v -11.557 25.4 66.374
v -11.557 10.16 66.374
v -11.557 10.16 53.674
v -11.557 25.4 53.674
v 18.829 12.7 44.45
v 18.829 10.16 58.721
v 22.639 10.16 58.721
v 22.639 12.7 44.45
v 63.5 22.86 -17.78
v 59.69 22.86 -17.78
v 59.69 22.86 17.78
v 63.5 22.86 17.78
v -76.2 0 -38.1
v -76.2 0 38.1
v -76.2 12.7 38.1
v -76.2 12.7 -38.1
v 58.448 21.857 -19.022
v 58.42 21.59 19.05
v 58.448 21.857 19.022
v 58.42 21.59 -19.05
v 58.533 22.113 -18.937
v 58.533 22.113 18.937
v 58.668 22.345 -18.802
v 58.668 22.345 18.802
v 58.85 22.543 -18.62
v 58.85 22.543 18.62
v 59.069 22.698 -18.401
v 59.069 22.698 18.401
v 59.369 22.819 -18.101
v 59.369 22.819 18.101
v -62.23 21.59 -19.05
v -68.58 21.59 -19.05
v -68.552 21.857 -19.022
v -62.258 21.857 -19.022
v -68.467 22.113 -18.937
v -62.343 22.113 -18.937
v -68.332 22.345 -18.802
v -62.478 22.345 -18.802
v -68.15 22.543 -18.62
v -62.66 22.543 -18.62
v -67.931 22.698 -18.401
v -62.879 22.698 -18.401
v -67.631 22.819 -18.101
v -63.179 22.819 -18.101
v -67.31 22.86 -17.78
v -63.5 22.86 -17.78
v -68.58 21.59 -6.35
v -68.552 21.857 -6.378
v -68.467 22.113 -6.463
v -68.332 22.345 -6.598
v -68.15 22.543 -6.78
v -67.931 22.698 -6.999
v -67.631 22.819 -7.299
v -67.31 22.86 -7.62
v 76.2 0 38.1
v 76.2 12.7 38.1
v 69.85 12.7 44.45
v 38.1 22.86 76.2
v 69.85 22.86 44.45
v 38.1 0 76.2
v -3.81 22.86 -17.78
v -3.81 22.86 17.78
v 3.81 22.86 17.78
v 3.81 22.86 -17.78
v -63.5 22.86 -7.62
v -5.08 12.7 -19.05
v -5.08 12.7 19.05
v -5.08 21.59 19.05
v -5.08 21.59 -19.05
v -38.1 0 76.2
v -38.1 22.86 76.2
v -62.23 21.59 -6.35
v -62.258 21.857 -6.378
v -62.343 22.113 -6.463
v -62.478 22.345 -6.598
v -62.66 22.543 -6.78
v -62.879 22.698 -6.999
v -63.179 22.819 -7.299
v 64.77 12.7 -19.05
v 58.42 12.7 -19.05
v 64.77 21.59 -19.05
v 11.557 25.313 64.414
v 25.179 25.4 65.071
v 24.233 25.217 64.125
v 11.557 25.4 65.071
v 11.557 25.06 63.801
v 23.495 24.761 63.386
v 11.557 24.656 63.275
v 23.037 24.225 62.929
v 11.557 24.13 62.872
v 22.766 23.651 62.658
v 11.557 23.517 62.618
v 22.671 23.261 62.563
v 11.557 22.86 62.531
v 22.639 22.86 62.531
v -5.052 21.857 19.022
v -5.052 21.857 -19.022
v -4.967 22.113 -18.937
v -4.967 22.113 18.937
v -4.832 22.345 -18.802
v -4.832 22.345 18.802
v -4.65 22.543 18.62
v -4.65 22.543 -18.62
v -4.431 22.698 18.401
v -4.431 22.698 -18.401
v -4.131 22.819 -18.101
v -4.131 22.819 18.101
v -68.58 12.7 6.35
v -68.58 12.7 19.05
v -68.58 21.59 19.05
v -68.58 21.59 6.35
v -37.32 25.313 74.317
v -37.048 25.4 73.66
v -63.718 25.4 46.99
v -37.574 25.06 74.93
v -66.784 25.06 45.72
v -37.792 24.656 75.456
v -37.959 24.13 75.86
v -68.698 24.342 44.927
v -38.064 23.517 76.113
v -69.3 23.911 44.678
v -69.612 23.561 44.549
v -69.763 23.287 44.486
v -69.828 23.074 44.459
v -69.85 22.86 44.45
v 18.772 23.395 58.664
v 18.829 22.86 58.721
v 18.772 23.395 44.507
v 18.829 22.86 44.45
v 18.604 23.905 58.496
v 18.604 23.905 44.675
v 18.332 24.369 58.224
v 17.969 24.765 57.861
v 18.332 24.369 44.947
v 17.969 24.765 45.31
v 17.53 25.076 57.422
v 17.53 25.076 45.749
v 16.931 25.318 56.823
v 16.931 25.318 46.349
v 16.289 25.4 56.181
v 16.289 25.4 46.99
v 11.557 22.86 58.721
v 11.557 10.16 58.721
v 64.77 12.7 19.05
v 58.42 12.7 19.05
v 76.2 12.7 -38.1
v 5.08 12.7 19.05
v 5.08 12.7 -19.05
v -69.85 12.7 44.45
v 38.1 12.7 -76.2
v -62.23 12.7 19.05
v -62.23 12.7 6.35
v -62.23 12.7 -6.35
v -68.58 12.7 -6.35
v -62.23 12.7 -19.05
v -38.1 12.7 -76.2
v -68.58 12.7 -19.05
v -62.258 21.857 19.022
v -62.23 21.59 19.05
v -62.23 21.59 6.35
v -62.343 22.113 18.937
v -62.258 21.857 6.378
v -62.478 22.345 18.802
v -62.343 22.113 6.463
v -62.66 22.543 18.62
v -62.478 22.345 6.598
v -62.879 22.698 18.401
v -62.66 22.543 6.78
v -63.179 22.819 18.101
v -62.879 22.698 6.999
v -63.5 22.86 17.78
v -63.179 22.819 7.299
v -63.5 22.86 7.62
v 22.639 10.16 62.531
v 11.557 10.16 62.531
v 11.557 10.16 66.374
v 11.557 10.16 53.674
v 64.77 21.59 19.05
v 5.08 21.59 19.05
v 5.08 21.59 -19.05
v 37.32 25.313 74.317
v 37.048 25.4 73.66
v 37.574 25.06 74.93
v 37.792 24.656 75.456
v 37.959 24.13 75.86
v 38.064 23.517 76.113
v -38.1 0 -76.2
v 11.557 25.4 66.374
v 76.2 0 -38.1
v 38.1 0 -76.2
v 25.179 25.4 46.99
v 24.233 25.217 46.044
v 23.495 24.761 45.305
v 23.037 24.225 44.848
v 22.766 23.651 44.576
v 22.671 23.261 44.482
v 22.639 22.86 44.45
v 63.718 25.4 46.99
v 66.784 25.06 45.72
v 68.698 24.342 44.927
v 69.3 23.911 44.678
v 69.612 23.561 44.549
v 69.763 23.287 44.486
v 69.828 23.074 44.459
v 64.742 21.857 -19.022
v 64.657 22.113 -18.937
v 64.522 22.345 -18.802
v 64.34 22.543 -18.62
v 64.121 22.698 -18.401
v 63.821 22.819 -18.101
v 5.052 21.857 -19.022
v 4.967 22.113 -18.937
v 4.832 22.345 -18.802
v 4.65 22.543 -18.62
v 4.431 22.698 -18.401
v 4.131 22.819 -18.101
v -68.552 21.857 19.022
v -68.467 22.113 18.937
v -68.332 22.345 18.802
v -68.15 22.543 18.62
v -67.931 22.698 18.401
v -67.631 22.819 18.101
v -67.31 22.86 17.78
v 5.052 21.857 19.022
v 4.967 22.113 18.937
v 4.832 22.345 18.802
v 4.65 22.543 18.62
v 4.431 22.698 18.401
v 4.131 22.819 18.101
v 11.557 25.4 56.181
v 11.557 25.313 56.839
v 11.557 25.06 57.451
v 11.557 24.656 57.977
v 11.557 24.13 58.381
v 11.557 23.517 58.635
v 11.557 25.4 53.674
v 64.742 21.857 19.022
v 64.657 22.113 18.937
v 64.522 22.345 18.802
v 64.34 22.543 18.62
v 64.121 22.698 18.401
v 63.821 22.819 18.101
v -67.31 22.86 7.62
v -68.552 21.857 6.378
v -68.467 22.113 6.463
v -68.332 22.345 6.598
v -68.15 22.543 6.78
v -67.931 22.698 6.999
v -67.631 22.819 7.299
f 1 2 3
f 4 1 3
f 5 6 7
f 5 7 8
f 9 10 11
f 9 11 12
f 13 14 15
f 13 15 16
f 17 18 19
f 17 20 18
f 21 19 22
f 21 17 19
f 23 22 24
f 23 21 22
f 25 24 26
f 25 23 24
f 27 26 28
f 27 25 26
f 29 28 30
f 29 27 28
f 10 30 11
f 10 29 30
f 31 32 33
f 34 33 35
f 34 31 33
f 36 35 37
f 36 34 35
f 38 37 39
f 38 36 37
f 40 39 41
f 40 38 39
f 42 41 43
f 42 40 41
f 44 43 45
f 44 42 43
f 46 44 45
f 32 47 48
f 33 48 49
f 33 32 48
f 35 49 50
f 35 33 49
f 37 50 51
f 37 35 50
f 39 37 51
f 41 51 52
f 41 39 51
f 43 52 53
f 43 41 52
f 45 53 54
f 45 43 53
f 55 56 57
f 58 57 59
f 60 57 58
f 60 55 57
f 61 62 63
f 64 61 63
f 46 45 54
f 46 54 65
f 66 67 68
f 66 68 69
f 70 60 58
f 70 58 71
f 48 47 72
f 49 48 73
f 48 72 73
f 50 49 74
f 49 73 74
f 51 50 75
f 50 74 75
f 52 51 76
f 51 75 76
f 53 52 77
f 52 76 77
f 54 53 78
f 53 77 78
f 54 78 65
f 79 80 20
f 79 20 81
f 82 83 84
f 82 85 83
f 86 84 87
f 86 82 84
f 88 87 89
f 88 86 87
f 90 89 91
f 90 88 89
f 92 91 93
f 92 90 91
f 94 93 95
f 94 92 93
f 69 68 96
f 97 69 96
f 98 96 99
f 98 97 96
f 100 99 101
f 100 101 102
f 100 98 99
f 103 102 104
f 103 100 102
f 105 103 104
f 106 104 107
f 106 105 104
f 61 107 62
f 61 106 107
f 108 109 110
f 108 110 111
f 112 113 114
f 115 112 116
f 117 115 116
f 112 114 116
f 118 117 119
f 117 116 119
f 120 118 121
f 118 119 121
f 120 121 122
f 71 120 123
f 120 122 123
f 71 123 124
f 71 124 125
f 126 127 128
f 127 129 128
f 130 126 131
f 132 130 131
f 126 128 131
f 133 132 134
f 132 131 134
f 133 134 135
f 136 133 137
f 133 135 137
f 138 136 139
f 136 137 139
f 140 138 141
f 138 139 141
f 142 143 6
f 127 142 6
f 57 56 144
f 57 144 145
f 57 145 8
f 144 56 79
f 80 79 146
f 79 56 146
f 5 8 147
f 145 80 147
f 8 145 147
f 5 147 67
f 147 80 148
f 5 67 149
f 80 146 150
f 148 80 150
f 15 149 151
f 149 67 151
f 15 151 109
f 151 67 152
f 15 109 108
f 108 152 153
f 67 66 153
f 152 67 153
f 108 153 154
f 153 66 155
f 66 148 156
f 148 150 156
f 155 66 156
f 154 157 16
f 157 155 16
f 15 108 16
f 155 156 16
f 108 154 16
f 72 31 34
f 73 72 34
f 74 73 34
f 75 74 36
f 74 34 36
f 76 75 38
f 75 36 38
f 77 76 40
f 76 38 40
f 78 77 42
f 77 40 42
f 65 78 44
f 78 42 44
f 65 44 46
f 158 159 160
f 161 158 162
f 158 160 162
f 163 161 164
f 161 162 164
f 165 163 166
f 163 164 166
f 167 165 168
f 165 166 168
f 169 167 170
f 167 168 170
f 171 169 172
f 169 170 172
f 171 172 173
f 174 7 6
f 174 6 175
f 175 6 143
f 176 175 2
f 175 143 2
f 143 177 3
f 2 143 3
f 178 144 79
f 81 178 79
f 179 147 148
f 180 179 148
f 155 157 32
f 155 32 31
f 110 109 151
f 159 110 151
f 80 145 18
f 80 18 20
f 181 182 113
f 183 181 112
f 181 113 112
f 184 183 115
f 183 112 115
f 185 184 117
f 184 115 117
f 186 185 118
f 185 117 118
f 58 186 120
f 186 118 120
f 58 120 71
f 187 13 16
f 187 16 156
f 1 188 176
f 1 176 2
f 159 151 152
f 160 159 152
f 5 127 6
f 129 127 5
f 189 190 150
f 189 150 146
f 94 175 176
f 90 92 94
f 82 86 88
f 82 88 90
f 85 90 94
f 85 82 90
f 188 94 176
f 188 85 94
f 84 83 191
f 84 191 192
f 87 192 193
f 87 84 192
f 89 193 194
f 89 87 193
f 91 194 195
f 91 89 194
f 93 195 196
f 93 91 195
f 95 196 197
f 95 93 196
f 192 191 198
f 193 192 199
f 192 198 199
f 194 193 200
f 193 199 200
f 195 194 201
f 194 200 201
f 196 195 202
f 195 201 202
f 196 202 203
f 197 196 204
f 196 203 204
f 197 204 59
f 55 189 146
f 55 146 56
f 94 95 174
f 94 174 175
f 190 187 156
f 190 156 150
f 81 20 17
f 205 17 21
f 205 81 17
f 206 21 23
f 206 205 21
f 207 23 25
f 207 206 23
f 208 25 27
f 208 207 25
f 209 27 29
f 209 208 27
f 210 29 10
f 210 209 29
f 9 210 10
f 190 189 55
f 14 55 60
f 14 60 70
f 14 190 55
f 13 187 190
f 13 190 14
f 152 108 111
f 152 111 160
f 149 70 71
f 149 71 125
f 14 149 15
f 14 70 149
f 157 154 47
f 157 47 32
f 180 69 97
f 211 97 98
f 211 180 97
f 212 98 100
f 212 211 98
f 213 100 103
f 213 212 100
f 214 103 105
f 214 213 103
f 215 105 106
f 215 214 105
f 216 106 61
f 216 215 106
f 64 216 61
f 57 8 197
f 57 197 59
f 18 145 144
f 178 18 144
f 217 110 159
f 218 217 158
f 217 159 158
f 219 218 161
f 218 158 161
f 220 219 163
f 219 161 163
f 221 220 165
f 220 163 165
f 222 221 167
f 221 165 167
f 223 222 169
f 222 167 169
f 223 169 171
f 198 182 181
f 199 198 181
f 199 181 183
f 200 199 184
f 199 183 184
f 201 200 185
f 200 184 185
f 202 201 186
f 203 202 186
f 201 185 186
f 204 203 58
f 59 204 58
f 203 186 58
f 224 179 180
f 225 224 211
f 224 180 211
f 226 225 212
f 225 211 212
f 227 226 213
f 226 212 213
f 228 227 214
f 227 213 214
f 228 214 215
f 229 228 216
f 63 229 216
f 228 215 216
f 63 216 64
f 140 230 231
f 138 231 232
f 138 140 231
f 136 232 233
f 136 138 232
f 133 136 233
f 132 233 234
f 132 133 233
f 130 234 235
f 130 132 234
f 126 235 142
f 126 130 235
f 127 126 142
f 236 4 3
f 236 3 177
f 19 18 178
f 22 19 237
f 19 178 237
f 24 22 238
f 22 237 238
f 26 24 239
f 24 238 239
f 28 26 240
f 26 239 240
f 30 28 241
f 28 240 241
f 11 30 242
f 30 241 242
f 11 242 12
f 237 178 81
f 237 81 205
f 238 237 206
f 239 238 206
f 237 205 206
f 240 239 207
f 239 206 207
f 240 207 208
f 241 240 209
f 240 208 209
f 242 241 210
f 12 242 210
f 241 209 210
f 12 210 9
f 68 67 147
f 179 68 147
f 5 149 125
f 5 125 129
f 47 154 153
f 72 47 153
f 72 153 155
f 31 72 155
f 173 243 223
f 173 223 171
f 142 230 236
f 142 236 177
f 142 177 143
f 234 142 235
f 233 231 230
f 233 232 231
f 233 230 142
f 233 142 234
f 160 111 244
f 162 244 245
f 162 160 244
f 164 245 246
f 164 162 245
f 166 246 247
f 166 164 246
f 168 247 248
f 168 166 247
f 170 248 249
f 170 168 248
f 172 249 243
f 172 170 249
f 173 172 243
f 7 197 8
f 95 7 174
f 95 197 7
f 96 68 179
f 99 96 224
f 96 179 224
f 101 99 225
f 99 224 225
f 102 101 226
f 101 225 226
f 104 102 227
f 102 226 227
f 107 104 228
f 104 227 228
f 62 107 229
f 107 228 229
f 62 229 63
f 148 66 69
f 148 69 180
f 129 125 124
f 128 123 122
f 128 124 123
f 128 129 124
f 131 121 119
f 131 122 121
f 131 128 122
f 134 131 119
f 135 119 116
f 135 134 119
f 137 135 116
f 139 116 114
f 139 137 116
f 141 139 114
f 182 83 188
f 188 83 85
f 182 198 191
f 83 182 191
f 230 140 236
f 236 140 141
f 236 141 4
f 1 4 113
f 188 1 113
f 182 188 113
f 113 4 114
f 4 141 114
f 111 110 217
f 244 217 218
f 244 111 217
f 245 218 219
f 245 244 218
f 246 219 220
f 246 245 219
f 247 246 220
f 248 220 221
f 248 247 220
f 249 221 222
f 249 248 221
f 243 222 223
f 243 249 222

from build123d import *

# Parameters (mm, degrees)
BOSS_EXTRUDE1_DEPTH = 12.7
SKETCH2_W           = 10.16
SKETCH2_H           = 38.1
SKETCH2_W_2         = 6.35
SKETCH2_H_2         = 12.7
BOSS_EXTRUDE2_DEPTH = 10.16
BOSS_EXTRUDE3_DEPTH = 12.7
CUT_EXTRUDE1_DEPTH  = 15.24
FILLET2_R           = 2.54
FILLET4_R           = 1.27
BOSS_EXTRUDE4_DEPTH = 3.81


with BuildPart() as part:
    # Sketch1 → Boss-Extrude1 (new body)
    with BuildSketch(Plane(origin=(0, 0, 0), x_dir=(1, 0, 0), z_dir=(0, 1, 0))):
        Polygon((-38.1, 76.2), (38.1, 76.2), (76.2, 38.1), (76.2, -38.1), (38.1, -76.2), (-38.1, -76.2), (-76.2, -38.1), (-76.2, 38.1), align=None)
    extrude(amount=BOSS_EXTRUDE1_DEPTH)

    # Sketch2 → Boss-Extrude2 (add)
    with BuildSketch(Plane(origin=(0, 12.7, 0), x_dir=(1, 0, 0), z_dir=(0, 1, 0))):
        Rectangle(SKETCH2_W, SKETCH2_H)
        with Locations((61.595, 0)):
            Rectangle(SKETCH2_W_2, SKETCH2_H)
        with Locations((-65.405, 12.7)):
            Rectangle(SKETCH2_W_2, SKETCH2_H_2)
        with Locations((-65.405, -12.7)):
            Rectangle(SKETCH2_W_2, SKETCH2_H_2)
    extrude(amount=BOSS_EXTRUDE2_DEPTH)

    # Sketch4 → Boss-Extrude3 (add)
    with BuildSketch(Plane(origin=(0, 12.7, 0), x_dir=(1, 0, 0), z_dir=(0, 1, 0))):
        Polygon((-69.85, -44.45), (69.85, -44.45), (38.1, -76.2), (-38.1, -76.2), align=None)
    extrude(amount=BOSS_EXTRUDE3_DEPTH)

    # Sketch5 → Cut-Extrude1 (cut)
    with BuildSketch(Plane(origin=(0, 25.4, 0), x_dir=(1, 0, 0), z_dir=(0, 1, 0))):
        Polygon((11.557, -58.721300535), (18.829335275, -58.721300535), (18.829335275, -44.45), (22.639335275, -44.45), (22.639335275, -62.531300535), (11.557, -62.531300535), (11.557, -66.37376468), (-11.557, -66.37376468), (-11.557, -53.67376468), (11.557, -53.67376468), align=None)
    extrude(amount=-CUT_EXTRUDE1_DEPTH, mode=Mode.SUBTRACT)

    # Fillet2
    fillet2_edges = [part.edges().sort_by_distance(p)[0] for p in [
        (-53.975, 25.4, 60.325),
        (0, 25.4, 76.2),
        (53.975, 25.4, 60.325),
        (46.244667637, 25.4, 44.45),
        (-25.510332363, 25.4, 44.45),
        (17.098167637, 25.4, 62.531300535),
        (22.639335275, 25.4, 53.490650267),
        (18.829335275, 25.4, 51.585650267),
        (15.193167637, 25.4, 58.721300535),
    ]]
    fillet(fillet2_edges, radius=FILLET2_R)

    # Fillet4
    fillet4_edges = [part.edges().sort_by_distance(p)[0] for p in [
        (5.08, 22.86, 0),
        (0, 22.86, -19.05),
        (-5.08, 22.86, 0),
        (0, 22.86, 19.05),
        (58.42, 22.86, 0),
        (61.595, 22.86, 19.05),
        (64.77, 22.86, 0),
        (61.595, 22.86, -19.05),
        (-62.23, 22.86, -12.7),
        (-65.405, 22.86, -19.05),
        (-68.58, 22.86, -12.7),
        (-65.405, 22.86, -6.35),
        (-62.23, 22.86, 12.7),
        (-65.405, 22.86, 6.35),
        (-68.58, 22.86, 12.7),
        (-65.405, 22.86, 19.05),
    ]]
    fillet(fillet4_edges, radius=FILLET4_R)

    # Sketch8 → Boss-Extrude4 (add)
    with BuildSketch(Plane(origin=(18.829335275, 0, 0), x_dir=(0, 0, -1), z_dir=(1, 0, 0))):
        Polygon((-58.721300535, 10.16), (-44.45, 12.7), (-44.45, 10.16), align=None)
    extrude(amount=BOSS_EXTRUDE4_DEPTH)


solid = part.part
